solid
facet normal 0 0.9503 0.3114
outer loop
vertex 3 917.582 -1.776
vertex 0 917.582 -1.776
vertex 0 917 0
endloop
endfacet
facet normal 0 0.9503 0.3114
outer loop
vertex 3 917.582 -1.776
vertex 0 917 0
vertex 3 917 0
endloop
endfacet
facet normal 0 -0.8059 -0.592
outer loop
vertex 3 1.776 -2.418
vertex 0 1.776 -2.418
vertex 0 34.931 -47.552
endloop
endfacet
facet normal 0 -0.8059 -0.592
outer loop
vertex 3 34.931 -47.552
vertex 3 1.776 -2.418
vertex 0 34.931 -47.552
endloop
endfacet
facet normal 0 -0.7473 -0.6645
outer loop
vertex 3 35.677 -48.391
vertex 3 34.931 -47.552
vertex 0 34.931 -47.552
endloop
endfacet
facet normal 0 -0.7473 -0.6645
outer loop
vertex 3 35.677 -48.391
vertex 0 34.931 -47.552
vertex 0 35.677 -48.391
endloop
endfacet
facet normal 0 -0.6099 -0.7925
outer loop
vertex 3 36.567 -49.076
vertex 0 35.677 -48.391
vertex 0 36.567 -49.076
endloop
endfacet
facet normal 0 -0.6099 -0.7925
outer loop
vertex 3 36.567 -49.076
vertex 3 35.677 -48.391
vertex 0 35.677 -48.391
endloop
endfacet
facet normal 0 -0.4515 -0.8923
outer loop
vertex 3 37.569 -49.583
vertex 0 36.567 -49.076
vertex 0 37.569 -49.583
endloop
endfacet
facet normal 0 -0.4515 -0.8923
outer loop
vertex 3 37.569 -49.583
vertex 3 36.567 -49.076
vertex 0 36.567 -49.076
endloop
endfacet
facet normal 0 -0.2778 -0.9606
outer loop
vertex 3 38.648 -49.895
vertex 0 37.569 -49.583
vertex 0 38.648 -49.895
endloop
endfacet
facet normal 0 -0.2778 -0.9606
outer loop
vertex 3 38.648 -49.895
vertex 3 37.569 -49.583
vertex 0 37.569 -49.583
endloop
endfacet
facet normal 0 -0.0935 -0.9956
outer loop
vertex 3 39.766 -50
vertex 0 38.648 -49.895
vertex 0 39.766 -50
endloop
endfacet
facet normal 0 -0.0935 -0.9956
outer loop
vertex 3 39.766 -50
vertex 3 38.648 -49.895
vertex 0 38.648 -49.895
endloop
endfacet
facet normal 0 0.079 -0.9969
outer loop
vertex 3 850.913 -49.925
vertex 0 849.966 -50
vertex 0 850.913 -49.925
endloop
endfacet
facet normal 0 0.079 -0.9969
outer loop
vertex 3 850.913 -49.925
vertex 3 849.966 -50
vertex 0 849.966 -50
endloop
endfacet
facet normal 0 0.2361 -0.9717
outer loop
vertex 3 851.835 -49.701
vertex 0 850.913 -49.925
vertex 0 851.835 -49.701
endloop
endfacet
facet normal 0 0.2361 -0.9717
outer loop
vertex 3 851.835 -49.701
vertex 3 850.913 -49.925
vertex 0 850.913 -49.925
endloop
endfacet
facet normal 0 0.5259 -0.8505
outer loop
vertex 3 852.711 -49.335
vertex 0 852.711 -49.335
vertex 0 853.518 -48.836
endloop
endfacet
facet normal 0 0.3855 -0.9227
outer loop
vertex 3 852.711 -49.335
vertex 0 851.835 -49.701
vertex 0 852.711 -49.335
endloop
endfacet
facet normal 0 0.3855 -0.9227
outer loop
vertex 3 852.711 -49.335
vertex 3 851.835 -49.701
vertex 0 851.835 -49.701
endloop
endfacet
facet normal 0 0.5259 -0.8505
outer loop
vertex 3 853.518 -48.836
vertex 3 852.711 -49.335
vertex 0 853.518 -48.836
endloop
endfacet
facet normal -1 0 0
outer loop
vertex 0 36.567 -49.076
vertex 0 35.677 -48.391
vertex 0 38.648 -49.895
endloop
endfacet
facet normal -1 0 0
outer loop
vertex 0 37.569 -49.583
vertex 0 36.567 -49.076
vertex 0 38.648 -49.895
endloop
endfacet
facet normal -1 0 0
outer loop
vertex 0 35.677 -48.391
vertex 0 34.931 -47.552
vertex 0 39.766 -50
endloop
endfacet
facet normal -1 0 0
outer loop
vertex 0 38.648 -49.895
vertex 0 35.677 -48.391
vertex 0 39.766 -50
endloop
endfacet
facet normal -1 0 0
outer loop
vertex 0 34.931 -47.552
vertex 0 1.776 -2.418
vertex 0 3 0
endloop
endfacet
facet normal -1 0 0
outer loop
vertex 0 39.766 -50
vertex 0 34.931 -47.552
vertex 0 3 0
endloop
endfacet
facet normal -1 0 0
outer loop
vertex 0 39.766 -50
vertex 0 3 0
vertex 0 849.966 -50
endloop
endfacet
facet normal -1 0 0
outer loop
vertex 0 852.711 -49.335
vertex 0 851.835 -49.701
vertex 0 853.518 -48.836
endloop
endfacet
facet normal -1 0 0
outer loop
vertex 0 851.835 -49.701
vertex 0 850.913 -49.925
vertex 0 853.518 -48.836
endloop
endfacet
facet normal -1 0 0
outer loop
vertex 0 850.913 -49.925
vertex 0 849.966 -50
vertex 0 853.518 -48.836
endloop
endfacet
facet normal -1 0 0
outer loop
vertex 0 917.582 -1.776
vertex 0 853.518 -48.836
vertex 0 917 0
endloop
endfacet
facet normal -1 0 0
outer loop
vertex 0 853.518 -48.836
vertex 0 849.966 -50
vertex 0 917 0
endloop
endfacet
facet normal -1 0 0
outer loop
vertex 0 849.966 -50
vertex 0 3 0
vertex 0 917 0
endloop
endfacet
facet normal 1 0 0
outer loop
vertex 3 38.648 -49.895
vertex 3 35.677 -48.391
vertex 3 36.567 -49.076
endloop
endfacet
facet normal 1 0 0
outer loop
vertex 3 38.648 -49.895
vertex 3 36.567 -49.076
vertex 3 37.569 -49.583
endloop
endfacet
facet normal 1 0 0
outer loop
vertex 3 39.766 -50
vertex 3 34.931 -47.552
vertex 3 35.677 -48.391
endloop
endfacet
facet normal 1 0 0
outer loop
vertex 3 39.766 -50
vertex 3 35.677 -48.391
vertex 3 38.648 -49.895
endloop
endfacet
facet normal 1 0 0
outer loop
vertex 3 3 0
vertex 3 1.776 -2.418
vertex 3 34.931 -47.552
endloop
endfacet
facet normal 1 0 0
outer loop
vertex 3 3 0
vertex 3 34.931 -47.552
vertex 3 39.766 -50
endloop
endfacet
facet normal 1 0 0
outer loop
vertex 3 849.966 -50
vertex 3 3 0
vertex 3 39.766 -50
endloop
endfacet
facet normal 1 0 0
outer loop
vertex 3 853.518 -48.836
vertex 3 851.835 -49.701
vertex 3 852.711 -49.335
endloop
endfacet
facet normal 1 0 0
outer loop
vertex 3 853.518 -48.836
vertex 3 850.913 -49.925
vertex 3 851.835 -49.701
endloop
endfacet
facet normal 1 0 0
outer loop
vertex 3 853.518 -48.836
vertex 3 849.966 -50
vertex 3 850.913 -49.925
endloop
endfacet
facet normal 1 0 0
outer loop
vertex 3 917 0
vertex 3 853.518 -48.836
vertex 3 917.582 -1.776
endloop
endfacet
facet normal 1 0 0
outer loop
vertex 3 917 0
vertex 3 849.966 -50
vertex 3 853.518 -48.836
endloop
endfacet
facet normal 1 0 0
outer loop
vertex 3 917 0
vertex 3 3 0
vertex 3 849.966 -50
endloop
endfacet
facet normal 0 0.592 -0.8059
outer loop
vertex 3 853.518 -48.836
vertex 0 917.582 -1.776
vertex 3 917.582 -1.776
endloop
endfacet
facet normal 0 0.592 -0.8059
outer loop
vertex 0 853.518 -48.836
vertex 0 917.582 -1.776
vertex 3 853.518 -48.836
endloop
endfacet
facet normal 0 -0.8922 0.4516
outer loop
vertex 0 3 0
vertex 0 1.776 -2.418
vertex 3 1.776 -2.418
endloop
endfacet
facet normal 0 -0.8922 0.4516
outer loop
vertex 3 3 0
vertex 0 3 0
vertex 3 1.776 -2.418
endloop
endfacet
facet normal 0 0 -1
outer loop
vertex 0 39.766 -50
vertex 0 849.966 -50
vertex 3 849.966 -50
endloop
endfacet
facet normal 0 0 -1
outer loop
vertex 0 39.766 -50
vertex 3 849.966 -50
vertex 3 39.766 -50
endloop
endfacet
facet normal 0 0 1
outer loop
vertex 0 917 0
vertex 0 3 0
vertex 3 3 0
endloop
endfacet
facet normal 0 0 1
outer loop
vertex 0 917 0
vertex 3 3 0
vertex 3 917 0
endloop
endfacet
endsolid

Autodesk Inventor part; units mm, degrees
ref_plane "YZ Plane" through (0, 0, 0) normal (1, 0, 0) x (0, 1, 0)
ref_plane "XZ Plane" through (0, 0, 0) normal (0, 1, 0) x (-1, 0, 0)
ref_plane "XY Plane" through (0, 0, 0) normal (0, 0, 1) x (1, 0, 0)
sketch "Sketch2" plane through (0, 0, 0) normal (1, 0, 0) x (0, 1, 0)
  line L0 (0, 0) -> (920, 0)
  line L1 (920, 0) -> (920, -50)
  line L2 (920, -50) -> (0, -50)
  line L3 (0, -50) -> (0, 0)
  line L4 (920, -50) -> (883.2713, 0) construction
  line L5 (920, 0) -> (851.9332, -50)
  line L6 (0, 0) -> (36.7287, -50)
  dimension "d28" = 920
  dimension "d29" = 50
  dimension "d31" = 36.3
  dimension "d32" = 53.7
  dimension "d36" = 53.7
extrude "Plate2" add sketch "Sketch2" along normal blind 3 contours L0 L5 L2 L6
chamfer "Corner Chamfer1" distance 3 angle 45 2 edges at (1.5, 920, 0) (1.5, 0, 0)
fillet "Corner Round1" radius 6 2 edges at (1.5, 36.7287, -50) (1.5, 851.9332, -50)
equation "\"d36\" = d32"
equation "\"d30\" = Thickness"
equation "\"BendReliefWidth\" = Thickness"
equation "\"BendReliefDepth\" = 0.5 * Thickness"
equation "\"CornerReliefSize\" = 4 * Thickness"
equation "\"MinimumRemnant\" = 2 * Thickness"
equation "\"TransitionRadius\" = BendRadius"
equation "\"JacobiRadiusSize\" = BendRadius"
equation "\"GapSize\" = Thickness"
equation "\"Thickness\" = 3"
equation "\"BendRadius\" = 5"
properties part number "MSC 0691 stringer cone" material "Stainless Steel"
